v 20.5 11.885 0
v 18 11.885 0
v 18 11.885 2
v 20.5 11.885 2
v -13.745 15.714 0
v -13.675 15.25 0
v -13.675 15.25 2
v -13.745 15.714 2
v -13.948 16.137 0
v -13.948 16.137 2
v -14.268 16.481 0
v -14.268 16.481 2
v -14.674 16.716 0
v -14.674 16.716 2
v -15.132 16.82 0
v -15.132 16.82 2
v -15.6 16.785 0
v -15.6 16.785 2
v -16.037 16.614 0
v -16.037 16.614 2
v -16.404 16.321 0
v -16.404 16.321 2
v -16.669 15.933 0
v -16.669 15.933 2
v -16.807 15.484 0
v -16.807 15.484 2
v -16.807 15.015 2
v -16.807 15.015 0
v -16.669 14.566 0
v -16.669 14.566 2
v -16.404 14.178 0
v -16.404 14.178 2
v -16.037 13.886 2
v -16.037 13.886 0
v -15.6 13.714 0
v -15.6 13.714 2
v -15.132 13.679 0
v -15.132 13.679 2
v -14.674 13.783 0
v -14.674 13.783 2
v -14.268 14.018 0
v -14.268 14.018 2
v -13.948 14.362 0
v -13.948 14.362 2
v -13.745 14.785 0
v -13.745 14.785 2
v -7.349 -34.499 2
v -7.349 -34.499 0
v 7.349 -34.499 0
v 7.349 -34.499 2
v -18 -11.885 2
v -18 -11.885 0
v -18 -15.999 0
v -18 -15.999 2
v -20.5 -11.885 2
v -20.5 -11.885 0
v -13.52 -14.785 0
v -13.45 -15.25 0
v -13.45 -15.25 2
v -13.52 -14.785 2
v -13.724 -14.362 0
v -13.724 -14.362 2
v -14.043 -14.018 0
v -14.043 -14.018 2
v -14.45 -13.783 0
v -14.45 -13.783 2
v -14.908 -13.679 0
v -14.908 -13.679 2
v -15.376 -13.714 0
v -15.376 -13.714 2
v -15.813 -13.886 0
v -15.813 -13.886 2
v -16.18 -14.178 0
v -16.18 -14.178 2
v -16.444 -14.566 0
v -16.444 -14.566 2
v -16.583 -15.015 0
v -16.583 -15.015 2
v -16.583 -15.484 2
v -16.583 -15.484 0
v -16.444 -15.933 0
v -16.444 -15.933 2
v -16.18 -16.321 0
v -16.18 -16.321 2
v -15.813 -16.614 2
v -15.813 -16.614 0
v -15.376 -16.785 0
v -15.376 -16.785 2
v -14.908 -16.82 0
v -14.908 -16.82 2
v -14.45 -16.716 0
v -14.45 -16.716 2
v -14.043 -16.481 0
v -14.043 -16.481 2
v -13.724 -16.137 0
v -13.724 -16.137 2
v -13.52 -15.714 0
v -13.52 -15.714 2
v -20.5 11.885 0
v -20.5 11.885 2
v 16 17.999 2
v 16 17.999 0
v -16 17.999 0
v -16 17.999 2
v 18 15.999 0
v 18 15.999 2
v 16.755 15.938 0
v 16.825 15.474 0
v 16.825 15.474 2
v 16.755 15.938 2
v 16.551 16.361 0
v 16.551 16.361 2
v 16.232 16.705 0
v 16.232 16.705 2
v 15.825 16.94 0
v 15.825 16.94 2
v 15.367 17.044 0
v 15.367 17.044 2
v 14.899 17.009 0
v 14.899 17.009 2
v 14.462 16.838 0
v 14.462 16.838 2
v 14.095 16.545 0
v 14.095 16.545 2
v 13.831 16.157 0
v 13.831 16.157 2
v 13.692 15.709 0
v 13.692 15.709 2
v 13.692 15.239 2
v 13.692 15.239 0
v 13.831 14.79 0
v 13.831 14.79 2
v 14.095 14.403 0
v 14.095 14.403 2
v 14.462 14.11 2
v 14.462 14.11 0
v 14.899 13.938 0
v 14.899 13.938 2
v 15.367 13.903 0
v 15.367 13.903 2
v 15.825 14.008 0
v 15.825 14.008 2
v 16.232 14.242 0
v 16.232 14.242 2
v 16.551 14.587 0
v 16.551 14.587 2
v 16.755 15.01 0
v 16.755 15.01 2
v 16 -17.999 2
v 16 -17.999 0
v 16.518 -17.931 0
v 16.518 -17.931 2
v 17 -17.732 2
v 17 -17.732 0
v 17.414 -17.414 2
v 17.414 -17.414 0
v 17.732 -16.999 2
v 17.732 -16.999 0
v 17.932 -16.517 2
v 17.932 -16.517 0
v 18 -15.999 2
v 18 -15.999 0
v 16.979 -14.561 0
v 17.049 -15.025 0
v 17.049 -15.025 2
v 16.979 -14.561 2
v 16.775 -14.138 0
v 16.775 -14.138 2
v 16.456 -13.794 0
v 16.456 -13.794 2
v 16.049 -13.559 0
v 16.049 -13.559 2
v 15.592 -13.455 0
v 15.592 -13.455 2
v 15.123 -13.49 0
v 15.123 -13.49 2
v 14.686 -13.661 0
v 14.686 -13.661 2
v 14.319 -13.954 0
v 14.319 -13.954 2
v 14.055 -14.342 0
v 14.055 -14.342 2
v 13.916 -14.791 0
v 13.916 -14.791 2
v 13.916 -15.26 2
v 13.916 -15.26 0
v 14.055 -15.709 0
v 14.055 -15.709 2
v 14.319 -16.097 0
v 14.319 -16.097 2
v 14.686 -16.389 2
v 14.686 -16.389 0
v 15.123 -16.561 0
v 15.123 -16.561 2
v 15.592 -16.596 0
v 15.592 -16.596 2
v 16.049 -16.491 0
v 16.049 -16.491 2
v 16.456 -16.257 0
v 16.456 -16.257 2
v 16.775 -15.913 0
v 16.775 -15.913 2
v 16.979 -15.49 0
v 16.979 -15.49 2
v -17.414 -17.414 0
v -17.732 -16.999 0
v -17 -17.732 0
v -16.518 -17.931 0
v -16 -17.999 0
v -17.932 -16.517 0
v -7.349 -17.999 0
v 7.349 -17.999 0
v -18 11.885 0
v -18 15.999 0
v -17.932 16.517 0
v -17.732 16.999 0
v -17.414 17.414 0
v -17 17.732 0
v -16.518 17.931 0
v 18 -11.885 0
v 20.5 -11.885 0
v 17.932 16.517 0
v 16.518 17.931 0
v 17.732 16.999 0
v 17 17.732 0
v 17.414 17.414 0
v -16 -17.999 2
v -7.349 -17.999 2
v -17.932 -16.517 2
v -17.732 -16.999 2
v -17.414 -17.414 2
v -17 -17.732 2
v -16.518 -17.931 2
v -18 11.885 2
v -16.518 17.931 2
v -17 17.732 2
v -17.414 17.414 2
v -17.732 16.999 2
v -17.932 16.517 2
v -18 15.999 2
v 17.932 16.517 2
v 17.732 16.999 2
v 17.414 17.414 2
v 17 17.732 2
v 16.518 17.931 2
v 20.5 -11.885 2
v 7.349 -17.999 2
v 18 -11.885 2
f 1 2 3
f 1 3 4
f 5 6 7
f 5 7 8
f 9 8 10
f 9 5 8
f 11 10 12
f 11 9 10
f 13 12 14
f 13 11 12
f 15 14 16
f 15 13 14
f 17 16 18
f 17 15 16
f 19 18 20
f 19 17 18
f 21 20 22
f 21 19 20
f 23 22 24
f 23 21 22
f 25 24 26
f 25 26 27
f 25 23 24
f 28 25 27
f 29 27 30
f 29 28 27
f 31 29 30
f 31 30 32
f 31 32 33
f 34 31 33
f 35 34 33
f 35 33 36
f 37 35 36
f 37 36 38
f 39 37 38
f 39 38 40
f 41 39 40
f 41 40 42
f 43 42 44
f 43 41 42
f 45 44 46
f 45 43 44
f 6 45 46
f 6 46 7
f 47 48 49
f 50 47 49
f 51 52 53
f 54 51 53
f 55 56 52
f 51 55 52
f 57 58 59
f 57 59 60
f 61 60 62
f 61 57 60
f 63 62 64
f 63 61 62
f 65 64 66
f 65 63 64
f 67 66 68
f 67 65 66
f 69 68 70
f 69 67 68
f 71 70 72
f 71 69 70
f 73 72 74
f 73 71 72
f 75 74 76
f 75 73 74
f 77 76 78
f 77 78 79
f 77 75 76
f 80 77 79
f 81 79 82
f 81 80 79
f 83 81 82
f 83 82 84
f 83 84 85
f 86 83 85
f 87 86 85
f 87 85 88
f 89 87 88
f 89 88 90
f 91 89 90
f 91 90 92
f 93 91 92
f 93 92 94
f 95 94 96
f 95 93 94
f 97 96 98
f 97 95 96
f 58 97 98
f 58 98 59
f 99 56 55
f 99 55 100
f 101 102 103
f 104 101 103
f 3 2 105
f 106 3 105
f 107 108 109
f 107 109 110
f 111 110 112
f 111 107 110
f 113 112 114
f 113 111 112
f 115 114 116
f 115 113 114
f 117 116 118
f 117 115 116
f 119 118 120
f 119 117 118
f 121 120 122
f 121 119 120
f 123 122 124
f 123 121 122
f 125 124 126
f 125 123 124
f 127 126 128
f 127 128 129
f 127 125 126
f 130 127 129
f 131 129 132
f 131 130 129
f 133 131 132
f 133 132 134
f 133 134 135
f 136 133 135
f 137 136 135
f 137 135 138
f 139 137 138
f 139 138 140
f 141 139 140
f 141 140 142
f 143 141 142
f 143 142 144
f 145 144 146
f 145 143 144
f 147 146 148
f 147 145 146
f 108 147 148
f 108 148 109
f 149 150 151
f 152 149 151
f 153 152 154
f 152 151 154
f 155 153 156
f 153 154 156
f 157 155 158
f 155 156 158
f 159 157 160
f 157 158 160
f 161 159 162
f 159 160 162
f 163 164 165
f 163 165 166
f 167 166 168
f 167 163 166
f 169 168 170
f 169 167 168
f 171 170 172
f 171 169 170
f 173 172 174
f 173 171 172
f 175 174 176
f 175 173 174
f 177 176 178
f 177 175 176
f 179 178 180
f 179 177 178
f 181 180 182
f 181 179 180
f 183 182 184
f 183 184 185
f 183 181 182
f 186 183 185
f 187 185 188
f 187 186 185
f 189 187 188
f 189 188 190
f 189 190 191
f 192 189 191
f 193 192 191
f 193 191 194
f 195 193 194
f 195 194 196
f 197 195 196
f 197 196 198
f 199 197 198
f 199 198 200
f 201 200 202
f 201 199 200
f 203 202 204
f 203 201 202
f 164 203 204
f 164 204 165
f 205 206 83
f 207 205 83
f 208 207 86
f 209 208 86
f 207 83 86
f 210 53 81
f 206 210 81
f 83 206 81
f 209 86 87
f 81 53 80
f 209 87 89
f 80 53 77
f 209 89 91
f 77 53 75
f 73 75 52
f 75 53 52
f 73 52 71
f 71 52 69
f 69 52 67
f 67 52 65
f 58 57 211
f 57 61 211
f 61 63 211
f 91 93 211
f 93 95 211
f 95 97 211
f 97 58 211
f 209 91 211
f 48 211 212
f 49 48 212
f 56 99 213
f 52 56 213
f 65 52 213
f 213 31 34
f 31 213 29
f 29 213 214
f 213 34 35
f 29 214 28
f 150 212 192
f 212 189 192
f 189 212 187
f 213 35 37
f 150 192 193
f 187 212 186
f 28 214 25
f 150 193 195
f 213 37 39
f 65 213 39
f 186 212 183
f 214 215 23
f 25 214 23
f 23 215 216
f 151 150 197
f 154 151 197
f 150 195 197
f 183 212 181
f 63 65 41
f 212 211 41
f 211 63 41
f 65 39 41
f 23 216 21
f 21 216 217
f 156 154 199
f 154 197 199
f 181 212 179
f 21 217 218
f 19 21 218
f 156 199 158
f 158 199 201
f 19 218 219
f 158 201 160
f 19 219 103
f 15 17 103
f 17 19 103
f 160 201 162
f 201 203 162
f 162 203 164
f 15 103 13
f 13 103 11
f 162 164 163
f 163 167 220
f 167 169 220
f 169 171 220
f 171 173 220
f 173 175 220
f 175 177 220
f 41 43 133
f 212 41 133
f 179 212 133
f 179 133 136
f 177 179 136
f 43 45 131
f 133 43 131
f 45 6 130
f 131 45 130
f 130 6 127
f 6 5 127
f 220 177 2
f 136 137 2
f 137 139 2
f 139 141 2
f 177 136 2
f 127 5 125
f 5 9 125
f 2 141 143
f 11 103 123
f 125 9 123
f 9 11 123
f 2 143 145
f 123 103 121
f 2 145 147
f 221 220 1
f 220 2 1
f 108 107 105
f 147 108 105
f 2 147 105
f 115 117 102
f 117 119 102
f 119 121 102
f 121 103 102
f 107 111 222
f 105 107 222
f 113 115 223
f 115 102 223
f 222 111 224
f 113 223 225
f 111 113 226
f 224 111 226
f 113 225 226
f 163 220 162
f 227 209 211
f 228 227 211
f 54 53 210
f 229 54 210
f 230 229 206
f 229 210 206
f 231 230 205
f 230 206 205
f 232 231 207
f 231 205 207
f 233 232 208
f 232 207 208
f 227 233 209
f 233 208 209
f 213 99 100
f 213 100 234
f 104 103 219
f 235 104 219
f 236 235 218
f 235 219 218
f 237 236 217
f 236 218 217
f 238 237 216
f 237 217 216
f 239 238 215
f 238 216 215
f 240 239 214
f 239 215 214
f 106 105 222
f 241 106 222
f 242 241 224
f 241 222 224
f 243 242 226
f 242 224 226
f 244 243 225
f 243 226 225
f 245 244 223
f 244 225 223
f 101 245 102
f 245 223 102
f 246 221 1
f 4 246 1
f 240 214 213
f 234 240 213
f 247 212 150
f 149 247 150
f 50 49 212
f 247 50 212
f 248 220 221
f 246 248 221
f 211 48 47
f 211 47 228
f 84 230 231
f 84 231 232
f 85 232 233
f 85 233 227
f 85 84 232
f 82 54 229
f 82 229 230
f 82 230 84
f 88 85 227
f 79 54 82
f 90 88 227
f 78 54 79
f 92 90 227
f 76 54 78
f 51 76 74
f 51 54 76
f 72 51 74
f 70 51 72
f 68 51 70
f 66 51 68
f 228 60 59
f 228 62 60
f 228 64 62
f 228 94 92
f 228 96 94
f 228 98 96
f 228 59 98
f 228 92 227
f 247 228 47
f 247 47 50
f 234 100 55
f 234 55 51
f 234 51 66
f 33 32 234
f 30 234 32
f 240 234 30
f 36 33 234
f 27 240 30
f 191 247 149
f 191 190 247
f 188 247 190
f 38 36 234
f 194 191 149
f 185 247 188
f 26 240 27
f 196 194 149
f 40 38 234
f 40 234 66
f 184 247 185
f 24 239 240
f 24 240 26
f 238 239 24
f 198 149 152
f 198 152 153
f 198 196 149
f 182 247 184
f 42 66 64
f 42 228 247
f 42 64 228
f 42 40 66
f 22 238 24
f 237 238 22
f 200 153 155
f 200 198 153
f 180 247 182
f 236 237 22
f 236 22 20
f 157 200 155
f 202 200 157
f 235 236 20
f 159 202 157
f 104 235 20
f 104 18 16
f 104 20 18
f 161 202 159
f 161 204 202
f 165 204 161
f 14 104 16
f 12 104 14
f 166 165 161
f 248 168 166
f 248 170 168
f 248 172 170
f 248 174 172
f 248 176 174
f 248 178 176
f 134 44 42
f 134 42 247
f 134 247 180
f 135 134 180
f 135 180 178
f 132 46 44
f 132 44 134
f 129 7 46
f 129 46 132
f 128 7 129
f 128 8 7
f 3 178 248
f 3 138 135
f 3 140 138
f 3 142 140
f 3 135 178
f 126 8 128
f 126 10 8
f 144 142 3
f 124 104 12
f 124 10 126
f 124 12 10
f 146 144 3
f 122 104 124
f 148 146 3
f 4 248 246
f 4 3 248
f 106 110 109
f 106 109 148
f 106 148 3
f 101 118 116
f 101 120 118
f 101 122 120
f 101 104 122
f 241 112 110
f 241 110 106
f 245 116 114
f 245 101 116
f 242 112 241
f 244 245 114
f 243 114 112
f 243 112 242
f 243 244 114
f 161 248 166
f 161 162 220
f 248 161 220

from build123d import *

# Parameters (mm, degrees)
F0_R     = 1.575
F0_W     = 14.697724
F0_H     = 16.5
F0_W_2   = 2.5
F0_H_2   = 23.769202
F1_DEPTH = 2


with BuildPart() as f1:
    # F0 (on Top) → F1 (new body)
    with BuildSketch(Plane.XY):
        with BuildLine():
            ThreePointArc((-18, -15.999481), (-17.414214, -17.413694), (-16, -17.999481))
            Line((-16, -17.999481), (-7.348862, -17.999481))
            Line((-7.348862, -17.999481), (7.348862, -17.999481))
            Line((7.348862, -17.999481), (16, -17.999481))
            ThreePointArc((16, -17.999481), (17.414214, -17.413694), (18, -15.999481))
            Line((18, -15.999481), (18, -11.884601))
            Line((18, -11.884601), (18, 11.884601))
            Line((18, 11.884601), (18, 15.999481))
            ThreePointArc((18, 15.999481), (17.414214, 17.413694), (16, 17.999481))
            Line((16, 17.999481), (-16, 17.999481))
            ThreePointArc((-16, 17.999481), (-17.414214, 17.413694), (-18, 15.999481))
            Line((-18, 15.999481), (-18, 11.884601))
            Line((-18, 11.884601), (-18, -11.884601))
            Line((-18, -11.884601), (-18, -15.999481))
        make_face()
        with Locations((-15.025322, -15.249588)):
            Circle(F0_R, mode=Mode.SUBTRACT)
        with Locations((15.473853, -15.025322)):
            Circle(F0_R, mode=Mode.SUBTRACT)
        with Locations((-15.249588, 15.249588)):
            Circle(F0_R, mode=Mode.SUBTRACT)
        with Locations((15.249588, 15.473853)):
            Circle(F0_R, mode=Mode.SUBTRACT)
        with Locations((0, -26.249481)):
            Rectangle(F0_W, F0_H)
        with Locations((-19.25, 0)):
            Rectangle(F0_W_2, F0_H_2)
        with Locations((19.25, 0)):
            Rectangle(F0_W_2, F0_H_2)
    extrude(amount=F1_DEPTH)


solid = f1.part
